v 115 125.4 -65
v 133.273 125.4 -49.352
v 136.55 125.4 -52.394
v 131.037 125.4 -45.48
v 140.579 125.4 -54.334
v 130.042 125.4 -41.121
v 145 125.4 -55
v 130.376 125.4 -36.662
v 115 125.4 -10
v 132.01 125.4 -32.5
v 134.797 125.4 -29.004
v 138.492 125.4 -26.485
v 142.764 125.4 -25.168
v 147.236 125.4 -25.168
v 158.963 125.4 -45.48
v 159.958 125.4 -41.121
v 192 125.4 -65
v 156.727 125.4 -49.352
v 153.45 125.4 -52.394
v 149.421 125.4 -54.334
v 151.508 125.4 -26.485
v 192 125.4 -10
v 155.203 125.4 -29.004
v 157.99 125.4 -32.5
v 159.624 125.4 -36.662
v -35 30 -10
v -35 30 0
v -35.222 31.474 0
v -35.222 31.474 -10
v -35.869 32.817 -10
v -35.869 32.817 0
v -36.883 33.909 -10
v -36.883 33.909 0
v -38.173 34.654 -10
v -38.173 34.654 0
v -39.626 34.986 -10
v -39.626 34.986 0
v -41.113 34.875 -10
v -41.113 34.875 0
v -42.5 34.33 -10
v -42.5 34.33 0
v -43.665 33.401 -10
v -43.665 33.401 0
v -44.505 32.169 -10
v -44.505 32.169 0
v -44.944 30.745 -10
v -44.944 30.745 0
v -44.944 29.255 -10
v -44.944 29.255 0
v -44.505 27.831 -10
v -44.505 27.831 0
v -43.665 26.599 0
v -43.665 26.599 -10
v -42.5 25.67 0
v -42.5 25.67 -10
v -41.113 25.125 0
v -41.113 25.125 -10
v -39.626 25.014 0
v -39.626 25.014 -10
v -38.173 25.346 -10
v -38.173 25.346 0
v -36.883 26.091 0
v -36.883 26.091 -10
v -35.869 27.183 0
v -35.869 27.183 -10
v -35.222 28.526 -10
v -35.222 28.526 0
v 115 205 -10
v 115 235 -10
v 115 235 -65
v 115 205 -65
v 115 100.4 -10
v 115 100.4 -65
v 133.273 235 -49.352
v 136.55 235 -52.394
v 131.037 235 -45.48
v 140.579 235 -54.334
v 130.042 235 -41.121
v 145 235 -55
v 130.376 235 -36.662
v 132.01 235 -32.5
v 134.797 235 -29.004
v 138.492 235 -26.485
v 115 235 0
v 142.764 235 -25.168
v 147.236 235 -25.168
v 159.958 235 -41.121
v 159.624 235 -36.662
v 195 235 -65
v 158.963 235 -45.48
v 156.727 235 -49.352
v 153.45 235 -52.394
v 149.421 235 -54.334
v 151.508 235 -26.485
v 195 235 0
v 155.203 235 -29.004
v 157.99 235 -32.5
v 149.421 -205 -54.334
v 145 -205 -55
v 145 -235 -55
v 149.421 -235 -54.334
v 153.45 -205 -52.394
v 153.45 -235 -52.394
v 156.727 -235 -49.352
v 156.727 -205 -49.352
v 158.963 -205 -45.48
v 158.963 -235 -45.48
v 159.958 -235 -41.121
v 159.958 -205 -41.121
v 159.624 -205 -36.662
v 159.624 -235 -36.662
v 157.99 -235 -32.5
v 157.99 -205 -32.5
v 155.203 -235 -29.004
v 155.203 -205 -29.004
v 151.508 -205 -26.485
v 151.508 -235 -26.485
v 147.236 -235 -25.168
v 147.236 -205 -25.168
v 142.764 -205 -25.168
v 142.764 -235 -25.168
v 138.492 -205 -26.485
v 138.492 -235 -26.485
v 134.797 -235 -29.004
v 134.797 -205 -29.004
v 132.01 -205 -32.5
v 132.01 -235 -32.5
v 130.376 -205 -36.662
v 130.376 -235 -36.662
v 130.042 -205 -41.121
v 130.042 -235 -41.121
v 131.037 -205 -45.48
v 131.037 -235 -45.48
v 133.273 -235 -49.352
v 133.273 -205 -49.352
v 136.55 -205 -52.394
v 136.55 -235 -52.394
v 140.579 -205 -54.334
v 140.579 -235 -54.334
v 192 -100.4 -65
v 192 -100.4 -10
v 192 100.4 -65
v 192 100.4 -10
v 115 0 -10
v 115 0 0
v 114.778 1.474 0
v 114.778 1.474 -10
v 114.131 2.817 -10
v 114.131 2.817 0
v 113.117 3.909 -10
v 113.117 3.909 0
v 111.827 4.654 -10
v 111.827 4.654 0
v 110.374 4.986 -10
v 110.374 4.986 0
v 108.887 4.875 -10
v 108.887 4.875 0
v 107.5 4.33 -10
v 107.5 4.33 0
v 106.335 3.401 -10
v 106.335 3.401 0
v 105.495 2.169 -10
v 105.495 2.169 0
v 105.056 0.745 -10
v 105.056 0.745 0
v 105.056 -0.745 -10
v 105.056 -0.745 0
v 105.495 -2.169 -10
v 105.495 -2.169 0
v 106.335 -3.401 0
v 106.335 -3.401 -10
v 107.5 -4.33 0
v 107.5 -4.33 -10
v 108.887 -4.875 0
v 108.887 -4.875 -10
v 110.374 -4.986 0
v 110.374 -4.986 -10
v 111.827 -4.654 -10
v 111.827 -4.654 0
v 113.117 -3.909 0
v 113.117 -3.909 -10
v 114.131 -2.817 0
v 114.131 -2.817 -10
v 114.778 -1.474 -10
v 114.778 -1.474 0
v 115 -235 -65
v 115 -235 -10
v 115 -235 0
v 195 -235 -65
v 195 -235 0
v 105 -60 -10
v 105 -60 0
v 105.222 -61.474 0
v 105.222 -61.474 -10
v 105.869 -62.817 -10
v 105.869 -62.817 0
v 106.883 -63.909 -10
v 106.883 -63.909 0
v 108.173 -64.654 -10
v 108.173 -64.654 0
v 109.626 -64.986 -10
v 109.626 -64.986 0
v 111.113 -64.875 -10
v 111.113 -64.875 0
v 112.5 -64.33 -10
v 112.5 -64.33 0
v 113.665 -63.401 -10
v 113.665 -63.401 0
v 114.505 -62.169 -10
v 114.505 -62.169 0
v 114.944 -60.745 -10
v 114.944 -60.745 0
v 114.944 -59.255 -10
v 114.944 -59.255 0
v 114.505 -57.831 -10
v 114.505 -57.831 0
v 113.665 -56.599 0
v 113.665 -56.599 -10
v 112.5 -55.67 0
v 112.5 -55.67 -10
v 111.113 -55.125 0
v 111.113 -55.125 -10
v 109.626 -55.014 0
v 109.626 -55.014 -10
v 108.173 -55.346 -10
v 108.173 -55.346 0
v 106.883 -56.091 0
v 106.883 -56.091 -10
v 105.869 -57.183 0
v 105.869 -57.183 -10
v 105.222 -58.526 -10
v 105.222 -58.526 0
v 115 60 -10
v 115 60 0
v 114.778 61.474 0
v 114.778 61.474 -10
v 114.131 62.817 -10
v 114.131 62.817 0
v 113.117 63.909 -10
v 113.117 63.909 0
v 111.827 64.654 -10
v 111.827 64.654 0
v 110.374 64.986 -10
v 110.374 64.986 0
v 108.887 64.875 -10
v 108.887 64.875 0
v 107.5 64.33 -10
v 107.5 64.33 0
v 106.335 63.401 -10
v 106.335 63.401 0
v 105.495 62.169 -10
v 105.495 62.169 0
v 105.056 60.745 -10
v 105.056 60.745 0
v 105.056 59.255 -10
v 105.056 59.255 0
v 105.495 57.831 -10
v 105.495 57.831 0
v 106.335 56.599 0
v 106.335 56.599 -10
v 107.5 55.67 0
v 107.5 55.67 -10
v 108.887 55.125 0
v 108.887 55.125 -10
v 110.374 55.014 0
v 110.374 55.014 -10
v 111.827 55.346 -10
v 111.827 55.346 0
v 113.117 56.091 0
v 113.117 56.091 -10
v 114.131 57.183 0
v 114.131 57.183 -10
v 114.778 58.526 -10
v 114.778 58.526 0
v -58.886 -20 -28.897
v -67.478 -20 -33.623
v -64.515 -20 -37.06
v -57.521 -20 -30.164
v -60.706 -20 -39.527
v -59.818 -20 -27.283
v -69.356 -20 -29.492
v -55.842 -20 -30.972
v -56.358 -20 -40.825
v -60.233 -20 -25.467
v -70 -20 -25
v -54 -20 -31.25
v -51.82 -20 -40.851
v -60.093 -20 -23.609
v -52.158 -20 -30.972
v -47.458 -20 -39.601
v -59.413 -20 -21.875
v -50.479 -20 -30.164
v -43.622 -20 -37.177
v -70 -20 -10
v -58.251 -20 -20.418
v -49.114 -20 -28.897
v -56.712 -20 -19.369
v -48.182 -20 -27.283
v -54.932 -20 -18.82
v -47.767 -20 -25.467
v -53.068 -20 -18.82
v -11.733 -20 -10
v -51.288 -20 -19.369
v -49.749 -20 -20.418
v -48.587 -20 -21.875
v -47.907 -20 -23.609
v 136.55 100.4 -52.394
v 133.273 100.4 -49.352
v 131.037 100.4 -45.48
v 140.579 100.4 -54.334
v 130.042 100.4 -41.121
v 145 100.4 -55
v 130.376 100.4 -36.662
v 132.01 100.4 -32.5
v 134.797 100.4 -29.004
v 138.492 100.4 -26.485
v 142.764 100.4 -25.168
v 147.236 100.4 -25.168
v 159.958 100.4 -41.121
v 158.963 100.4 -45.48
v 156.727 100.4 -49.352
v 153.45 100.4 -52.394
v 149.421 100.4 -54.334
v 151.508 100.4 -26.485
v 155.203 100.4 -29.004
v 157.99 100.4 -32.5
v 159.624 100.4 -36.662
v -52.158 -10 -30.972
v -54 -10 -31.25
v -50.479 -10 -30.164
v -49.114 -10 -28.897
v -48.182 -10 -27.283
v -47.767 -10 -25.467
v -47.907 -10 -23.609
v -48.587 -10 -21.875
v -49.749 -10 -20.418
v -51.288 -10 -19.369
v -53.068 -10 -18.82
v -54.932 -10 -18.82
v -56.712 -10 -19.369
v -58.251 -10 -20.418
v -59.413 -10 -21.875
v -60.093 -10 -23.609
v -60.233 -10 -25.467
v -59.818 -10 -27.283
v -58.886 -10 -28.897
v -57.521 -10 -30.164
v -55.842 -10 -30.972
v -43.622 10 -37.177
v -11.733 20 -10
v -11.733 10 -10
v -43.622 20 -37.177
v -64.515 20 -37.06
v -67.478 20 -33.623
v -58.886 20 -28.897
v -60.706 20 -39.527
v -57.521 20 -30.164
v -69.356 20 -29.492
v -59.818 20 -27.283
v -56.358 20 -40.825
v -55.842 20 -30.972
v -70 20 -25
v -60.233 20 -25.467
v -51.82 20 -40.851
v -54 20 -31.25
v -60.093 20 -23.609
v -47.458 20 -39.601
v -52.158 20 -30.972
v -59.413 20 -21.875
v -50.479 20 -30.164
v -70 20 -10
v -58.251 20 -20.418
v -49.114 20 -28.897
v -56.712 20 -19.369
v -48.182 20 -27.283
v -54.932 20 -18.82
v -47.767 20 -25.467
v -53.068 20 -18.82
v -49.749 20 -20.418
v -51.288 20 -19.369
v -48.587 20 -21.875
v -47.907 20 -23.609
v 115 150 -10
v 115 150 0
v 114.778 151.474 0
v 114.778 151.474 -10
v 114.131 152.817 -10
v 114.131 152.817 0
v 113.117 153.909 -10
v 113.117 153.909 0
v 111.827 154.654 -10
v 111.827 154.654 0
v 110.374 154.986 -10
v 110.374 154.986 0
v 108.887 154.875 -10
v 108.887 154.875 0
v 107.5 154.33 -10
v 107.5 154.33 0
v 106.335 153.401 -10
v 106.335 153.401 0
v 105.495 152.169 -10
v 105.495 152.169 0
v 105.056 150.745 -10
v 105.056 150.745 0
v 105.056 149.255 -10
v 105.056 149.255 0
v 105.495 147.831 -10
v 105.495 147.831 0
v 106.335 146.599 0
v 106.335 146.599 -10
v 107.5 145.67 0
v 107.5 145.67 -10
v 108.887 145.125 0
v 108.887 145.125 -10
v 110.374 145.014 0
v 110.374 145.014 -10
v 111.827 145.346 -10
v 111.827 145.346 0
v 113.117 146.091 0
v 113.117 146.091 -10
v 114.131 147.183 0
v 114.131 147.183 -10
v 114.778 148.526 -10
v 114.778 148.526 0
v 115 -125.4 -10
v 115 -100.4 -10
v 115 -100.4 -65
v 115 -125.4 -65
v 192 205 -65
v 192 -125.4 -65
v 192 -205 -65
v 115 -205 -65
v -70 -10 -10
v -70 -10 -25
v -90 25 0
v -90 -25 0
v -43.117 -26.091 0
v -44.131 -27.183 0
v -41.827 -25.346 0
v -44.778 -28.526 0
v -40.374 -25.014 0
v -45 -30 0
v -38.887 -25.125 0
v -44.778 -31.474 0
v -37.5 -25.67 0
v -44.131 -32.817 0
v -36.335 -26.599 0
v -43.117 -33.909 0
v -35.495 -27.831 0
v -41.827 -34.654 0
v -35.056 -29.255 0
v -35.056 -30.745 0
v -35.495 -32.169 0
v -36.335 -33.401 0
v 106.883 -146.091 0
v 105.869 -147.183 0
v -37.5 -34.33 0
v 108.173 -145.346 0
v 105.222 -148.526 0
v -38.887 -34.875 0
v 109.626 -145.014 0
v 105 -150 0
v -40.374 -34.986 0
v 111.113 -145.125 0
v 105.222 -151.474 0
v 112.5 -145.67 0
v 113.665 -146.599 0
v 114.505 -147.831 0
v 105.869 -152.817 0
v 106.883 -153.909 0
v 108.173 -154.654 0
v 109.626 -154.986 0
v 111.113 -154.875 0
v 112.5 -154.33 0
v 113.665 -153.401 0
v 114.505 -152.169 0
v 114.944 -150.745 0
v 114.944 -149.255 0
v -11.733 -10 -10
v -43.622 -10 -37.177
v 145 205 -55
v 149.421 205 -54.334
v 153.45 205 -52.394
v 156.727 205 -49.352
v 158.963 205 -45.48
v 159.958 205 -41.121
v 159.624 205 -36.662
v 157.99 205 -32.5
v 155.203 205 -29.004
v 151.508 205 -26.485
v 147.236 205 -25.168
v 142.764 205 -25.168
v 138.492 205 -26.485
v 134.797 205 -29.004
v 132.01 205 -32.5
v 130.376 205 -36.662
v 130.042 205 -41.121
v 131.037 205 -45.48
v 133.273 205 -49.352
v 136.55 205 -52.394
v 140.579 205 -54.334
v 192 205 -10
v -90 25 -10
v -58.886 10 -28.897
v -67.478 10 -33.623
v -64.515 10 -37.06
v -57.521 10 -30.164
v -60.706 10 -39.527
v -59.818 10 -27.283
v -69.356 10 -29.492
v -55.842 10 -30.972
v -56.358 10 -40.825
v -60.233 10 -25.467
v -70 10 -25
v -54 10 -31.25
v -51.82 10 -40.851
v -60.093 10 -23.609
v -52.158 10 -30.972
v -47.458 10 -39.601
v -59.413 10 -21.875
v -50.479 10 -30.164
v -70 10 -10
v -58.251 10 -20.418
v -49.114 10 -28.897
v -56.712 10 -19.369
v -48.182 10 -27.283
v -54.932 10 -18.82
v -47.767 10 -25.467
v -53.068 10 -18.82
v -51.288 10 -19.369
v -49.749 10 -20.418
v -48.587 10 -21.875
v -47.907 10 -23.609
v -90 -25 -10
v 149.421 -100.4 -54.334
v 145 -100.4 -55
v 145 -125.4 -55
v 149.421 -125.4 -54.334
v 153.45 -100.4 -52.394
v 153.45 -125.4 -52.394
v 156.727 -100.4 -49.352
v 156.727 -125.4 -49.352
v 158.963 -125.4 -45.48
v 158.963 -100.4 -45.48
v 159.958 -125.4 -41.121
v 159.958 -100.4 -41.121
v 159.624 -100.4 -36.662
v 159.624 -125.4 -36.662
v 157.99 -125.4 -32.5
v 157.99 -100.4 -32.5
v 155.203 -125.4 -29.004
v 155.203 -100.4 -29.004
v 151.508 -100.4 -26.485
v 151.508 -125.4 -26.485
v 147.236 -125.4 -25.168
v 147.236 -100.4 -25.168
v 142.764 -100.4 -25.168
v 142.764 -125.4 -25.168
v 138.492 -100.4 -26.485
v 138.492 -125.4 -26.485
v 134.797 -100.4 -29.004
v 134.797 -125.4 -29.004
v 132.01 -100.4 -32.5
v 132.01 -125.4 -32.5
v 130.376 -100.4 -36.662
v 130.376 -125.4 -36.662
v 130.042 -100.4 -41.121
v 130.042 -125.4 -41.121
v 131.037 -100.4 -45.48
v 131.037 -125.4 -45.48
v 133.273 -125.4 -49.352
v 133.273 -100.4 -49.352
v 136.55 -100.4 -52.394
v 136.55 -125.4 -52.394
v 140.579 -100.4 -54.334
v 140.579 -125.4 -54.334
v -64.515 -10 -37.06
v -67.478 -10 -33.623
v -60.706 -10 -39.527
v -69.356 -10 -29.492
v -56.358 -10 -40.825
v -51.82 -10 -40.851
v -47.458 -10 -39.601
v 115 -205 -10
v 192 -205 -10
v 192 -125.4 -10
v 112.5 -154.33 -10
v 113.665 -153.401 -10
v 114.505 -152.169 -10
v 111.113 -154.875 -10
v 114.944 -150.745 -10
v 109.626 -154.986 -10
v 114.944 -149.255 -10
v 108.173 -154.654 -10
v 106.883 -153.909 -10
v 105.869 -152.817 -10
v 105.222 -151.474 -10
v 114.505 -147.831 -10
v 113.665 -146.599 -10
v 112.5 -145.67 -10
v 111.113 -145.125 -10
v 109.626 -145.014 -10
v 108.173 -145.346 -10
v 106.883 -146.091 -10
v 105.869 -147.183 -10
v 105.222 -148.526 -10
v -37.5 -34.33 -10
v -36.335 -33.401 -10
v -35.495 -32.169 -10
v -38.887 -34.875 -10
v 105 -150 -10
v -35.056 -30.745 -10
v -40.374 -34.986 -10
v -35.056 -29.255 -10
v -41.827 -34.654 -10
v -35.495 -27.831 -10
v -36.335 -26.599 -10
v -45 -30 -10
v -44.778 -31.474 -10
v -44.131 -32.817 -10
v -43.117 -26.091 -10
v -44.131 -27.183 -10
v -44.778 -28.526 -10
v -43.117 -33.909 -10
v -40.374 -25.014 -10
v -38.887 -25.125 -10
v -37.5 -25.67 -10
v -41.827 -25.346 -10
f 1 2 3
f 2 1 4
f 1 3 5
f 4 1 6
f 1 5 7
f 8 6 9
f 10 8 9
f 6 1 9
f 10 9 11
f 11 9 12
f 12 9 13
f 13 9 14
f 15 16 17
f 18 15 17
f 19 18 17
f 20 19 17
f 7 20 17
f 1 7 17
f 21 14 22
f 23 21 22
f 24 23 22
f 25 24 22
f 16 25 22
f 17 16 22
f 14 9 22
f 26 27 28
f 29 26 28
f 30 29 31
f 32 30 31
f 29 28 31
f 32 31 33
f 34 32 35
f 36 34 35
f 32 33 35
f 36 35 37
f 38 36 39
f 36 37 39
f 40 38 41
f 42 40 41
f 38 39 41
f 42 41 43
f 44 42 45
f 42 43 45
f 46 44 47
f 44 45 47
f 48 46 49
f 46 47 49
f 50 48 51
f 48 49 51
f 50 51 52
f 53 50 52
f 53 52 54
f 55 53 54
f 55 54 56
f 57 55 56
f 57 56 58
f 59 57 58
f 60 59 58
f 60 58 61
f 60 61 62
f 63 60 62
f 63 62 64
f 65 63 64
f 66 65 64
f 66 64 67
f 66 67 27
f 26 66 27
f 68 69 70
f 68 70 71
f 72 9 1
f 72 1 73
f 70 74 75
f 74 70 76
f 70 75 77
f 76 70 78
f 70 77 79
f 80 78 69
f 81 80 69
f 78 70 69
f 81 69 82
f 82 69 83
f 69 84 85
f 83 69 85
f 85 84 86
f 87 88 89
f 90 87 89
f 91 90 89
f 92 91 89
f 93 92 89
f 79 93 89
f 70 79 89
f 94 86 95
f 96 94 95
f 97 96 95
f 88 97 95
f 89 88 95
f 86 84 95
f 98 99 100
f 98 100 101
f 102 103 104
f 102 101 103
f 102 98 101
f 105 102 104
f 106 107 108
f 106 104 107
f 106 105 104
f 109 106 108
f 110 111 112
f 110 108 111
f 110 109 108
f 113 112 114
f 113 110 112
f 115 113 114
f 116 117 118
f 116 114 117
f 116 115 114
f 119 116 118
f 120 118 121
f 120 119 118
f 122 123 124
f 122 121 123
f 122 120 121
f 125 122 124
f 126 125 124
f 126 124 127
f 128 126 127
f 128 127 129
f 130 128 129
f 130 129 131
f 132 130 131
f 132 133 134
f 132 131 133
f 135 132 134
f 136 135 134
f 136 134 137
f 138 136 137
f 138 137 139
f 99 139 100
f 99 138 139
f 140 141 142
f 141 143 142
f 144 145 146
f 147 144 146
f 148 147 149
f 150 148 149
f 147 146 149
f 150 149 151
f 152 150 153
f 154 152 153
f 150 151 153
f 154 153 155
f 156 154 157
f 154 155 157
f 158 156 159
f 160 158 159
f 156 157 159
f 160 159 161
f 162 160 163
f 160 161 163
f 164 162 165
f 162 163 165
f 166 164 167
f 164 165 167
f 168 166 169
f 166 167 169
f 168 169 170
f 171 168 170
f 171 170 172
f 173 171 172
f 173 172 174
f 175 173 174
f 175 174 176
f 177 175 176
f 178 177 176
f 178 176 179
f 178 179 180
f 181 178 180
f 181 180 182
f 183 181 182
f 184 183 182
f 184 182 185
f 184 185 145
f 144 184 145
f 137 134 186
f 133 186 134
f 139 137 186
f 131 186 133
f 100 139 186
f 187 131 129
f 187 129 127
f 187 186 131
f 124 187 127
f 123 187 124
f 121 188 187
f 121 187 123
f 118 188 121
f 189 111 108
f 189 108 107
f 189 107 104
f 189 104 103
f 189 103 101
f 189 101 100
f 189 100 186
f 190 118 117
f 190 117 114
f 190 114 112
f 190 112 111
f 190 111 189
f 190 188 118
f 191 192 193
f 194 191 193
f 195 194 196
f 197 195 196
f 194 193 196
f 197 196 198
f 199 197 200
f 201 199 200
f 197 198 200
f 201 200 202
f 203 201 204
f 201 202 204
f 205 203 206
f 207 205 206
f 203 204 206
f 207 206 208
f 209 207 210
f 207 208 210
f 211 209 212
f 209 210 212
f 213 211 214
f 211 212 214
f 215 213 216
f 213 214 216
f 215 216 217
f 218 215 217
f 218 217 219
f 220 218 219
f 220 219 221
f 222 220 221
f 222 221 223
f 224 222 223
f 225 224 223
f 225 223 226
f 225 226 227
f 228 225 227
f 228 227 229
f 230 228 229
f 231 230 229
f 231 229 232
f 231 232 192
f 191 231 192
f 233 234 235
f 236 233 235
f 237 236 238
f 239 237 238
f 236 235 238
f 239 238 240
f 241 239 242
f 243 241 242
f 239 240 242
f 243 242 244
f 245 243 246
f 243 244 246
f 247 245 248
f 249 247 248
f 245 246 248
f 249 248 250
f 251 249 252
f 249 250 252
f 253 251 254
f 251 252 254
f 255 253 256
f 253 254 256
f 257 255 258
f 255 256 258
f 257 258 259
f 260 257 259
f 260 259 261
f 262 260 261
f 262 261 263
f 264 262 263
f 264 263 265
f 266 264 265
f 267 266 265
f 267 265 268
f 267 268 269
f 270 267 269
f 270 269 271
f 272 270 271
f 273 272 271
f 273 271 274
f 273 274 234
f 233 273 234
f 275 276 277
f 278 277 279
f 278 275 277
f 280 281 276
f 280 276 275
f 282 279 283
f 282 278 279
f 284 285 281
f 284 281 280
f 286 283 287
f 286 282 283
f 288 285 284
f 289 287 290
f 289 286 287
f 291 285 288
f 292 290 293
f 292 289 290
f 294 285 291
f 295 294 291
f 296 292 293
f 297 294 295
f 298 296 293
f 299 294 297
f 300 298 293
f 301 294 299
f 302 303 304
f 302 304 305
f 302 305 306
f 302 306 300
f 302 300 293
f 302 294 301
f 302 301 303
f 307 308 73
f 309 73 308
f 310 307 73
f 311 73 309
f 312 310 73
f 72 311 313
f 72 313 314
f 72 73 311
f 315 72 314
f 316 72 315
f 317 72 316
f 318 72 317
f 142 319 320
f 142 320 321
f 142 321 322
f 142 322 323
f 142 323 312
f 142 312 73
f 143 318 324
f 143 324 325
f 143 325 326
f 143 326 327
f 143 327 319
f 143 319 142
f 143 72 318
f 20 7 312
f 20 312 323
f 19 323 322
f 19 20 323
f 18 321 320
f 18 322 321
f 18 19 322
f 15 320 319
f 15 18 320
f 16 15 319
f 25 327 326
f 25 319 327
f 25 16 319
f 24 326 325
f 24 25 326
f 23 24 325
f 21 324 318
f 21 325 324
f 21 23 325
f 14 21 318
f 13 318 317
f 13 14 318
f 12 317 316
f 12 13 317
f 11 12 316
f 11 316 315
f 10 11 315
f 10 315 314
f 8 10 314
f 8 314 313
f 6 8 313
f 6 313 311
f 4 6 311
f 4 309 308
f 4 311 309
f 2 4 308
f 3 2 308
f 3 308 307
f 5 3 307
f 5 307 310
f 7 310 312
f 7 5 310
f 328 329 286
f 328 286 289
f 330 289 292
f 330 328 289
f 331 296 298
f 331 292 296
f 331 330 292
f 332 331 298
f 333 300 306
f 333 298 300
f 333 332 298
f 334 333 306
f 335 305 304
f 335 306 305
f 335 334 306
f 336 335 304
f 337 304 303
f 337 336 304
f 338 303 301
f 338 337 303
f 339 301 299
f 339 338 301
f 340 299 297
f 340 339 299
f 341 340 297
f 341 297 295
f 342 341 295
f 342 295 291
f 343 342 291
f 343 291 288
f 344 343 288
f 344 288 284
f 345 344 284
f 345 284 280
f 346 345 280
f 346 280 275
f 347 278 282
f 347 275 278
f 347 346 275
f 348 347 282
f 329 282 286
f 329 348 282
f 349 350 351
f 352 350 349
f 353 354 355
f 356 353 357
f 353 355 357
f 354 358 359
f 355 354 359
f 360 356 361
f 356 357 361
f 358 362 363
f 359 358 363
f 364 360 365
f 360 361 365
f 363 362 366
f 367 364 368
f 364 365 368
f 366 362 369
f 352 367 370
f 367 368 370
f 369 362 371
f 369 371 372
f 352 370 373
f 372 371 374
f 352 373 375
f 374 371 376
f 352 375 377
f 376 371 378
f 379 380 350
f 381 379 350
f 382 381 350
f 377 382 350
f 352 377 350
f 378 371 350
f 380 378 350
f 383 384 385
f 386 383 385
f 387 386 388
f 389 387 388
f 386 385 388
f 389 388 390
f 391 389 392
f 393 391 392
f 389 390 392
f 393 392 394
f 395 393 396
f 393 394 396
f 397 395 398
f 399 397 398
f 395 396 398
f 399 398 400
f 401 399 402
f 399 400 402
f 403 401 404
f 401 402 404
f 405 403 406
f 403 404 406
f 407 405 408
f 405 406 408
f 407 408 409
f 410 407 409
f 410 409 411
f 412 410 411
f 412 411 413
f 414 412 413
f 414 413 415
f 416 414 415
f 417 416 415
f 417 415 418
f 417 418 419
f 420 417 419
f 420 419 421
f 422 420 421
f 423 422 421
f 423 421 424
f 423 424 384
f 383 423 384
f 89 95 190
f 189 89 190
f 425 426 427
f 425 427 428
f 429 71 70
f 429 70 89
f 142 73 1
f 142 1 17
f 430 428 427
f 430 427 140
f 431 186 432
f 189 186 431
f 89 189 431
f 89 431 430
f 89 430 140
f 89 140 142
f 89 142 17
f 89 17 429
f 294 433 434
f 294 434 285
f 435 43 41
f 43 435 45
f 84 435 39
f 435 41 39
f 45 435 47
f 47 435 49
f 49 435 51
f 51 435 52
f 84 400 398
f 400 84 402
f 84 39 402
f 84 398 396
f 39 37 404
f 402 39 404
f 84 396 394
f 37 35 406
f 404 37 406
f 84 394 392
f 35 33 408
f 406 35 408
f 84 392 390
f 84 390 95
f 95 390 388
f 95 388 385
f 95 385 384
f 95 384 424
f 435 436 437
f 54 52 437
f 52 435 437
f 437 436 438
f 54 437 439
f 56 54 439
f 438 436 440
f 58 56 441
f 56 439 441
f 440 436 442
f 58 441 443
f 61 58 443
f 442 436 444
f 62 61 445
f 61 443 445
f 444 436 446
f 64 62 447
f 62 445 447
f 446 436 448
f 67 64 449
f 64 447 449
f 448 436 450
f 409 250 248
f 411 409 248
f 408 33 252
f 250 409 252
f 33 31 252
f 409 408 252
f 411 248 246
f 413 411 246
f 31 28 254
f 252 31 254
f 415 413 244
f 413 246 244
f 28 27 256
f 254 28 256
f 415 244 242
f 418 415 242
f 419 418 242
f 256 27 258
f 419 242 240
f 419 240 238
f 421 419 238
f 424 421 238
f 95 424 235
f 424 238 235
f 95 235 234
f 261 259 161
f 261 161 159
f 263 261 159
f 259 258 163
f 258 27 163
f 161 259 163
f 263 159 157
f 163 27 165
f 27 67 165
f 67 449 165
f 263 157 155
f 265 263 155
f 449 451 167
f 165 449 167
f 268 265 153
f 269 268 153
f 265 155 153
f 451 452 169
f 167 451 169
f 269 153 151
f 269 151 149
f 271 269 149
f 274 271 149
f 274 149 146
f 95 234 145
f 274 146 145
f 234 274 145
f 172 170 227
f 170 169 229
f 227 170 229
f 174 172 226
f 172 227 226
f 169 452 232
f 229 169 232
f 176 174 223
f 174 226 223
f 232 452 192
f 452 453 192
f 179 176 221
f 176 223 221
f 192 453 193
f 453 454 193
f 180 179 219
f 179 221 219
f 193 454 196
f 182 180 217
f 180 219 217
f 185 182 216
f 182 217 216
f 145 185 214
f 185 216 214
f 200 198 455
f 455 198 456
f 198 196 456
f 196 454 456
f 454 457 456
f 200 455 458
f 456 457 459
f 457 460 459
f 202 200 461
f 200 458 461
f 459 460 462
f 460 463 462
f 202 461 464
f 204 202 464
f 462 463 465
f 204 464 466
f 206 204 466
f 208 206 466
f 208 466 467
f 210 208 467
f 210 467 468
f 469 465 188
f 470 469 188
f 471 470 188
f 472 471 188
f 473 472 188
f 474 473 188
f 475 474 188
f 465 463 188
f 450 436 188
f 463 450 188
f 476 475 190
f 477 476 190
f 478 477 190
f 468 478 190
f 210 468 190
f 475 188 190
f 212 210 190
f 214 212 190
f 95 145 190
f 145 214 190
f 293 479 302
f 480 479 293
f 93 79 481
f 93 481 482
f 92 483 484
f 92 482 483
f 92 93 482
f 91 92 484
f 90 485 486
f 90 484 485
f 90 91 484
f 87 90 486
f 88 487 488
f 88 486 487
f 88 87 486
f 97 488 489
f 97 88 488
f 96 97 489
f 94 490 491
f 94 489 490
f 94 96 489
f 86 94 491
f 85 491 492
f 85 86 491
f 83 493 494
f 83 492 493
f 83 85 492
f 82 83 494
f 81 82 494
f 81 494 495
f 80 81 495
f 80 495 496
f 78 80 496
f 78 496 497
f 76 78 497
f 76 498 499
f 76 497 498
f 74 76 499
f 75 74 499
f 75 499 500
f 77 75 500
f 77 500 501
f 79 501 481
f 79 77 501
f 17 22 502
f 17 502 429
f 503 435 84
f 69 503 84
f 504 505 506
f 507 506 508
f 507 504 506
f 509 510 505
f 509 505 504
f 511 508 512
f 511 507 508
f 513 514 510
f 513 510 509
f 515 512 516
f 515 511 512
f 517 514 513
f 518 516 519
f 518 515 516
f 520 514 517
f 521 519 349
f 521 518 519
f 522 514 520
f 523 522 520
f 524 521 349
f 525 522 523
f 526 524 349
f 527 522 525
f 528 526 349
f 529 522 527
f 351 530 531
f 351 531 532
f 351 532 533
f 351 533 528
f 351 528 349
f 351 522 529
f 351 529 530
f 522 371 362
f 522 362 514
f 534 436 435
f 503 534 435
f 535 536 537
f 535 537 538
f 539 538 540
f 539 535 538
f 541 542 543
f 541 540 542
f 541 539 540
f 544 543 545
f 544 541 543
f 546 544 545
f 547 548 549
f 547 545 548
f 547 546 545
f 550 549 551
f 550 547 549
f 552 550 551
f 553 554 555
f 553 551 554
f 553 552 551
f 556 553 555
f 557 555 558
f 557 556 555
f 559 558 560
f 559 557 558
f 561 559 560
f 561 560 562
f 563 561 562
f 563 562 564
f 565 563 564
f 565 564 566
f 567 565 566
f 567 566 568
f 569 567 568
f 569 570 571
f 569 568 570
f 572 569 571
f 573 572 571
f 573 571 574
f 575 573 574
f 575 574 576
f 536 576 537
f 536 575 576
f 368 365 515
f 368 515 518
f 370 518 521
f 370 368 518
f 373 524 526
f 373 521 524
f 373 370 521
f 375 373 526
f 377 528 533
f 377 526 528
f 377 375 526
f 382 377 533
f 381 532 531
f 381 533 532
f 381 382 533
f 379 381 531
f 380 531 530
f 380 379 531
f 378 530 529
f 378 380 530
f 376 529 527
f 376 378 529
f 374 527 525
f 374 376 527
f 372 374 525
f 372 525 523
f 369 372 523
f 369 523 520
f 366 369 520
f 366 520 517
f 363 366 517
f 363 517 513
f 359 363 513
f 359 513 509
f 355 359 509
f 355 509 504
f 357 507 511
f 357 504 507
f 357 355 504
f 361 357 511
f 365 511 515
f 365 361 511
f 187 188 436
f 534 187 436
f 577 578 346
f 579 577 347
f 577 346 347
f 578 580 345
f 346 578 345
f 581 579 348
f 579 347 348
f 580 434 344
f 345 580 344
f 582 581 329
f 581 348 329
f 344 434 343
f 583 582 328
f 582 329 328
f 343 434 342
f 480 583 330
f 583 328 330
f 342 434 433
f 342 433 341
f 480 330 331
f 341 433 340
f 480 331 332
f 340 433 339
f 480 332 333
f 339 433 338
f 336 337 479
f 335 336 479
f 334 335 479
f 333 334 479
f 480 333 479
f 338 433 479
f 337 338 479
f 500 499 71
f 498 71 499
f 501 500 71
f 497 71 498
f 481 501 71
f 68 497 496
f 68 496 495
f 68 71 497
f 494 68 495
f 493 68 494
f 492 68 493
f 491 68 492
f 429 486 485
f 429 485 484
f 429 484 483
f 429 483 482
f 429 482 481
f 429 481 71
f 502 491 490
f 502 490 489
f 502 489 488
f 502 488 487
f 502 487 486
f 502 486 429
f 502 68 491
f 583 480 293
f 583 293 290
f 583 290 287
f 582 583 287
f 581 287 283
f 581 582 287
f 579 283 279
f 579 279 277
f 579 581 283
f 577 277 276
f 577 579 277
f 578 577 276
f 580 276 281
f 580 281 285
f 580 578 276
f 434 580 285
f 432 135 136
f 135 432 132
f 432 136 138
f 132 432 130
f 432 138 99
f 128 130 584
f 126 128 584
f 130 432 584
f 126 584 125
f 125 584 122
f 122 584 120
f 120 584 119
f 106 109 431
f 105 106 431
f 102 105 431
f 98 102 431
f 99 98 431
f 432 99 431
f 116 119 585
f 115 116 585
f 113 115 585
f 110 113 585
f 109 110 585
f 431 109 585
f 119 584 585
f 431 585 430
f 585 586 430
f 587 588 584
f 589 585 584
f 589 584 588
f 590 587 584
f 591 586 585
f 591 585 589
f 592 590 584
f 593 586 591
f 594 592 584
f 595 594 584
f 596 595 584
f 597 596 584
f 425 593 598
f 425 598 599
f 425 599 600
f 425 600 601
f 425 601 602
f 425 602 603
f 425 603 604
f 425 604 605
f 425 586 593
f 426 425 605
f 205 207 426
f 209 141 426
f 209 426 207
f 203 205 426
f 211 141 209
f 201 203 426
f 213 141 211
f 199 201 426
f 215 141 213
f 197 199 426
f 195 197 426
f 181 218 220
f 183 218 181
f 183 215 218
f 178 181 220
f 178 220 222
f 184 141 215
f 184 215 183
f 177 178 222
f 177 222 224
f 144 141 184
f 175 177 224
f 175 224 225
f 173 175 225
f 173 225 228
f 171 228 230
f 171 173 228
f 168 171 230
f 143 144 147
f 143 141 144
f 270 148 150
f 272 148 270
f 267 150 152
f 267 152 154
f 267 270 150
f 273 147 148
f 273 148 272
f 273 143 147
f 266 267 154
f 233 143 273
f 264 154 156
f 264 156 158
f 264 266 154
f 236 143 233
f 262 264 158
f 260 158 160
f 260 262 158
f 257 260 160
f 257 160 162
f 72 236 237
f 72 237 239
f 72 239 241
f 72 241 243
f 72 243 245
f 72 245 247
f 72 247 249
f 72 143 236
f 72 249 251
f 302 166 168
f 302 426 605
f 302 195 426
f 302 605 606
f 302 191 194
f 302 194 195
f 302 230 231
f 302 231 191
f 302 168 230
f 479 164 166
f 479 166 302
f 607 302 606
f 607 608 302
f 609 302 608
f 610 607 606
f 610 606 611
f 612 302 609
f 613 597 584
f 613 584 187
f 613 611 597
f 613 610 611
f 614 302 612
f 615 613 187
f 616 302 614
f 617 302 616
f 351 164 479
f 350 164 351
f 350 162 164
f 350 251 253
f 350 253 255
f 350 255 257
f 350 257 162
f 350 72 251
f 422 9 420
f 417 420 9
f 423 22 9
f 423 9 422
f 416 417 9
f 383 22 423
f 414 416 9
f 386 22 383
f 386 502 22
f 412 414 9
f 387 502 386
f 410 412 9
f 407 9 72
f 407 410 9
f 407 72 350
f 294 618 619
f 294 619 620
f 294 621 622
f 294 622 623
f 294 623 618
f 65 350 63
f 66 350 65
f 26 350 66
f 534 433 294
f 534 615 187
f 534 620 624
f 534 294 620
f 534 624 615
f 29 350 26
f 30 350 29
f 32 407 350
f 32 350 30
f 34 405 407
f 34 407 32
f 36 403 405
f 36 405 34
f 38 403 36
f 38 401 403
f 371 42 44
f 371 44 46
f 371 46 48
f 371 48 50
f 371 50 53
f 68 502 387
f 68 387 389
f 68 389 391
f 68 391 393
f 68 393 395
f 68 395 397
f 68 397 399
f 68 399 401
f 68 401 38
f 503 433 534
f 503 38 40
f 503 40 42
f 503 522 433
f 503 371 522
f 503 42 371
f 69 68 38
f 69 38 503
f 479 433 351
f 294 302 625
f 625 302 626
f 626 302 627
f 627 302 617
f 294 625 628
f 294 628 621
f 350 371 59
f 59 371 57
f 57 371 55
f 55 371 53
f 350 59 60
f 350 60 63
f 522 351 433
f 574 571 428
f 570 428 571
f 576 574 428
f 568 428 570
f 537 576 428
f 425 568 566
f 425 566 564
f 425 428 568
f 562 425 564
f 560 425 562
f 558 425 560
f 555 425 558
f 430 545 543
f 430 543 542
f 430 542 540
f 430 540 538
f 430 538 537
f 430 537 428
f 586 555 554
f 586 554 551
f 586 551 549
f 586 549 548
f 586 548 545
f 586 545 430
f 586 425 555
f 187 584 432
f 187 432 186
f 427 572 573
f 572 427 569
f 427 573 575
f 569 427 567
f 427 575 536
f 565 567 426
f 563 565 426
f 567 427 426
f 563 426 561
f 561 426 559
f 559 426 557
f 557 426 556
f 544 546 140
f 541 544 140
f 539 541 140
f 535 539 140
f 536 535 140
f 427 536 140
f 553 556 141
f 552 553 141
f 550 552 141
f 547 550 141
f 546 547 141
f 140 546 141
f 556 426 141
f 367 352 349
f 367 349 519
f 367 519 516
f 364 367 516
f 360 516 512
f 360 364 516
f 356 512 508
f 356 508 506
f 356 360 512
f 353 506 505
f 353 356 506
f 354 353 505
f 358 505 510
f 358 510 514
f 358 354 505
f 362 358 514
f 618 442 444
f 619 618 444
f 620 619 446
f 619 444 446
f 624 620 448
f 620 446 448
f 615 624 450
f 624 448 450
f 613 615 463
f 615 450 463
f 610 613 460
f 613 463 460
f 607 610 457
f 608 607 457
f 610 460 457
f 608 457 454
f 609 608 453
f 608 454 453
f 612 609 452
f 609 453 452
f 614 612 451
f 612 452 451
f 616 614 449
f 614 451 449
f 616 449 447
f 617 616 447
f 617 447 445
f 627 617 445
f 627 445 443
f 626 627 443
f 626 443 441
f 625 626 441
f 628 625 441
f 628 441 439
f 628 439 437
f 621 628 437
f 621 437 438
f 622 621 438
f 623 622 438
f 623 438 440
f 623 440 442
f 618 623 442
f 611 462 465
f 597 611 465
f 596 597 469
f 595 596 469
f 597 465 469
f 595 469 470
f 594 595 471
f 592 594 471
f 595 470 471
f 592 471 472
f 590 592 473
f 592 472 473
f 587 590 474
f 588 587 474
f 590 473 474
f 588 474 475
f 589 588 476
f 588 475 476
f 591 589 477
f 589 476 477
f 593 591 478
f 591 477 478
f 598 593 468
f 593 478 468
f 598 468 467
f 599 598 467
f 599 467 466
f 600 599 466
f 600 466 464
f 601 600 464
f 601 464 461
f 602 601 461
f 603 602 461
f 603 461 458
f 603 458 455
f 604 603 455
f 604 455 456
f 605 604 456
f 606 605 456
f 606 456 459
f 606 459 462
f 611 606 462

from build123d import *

# Parameters (mm, degrees)
SKETCH2_W               = 80
SKETCH2_H               = 25
BOSS_EXTRUDE1_DEPTH     = 65
BOSS_EXTRUDE1_2_DEPTH   = 65
SKETCH2_W_2             = 70
SKETCH2_H_2             = 10
BOSS_EXTRUDE1_3_DEPTH   = 65
BOSS_EXTRUDE1_4_DEPTH   = 65
SKETCH2_H_3             = 30
BOSS_EXTRUDE1_5_DEPTH   = 65
BOSS_EXTRUDE1_6_DEPTH   = 65
CUT_EXTRUDE1_DEPTH      = 313.209865315
CUT_EXTRUDE1_DEPTH_BACK = 313.209865315
SKETCH3_R               = 15
SKETCH3_R_2             = 6.25
BOSS_EXTRUDE5_DEPTH     = 10
CUT_EXTRUDE2_REACH      = 314.21
SKETCH7_R               = 5
SKETCH8_W               = 65
SKETCH8_H               = 470
BOSS_EXTRUDE6_DEPTH     = 3


with BuildPart() as part:
    # Sketch2 → Boss-Extrude1 (new body)
    with BuildSketch(Plane(origin=(0, 0, 0), x_dir=(1, 0, 0), z_dir=(0, 0, -1))):
        with Locations((155, -112.9)):
            Rectangle(SKETCH2_W, SKETCH2_H)
    extrude(amount=BOSS_EXTRUDE1_DEPTH)


with BuildPart() as body_2:
    # Sketch2 → Boss-Extrude1 2 (new body)
    with BuildSketch(Plane(origin=(0, 0, 0), x_dir=(1, 0, 0), z_dir=(0, 0, -1))):
        with Locations((155, 112.9)):
            Rectangle(SKETCH2_W, SKETCH2_H)
    extrude(amount=BOSS_EXTRUDE1_2_DEPTH)


with BuildPart() as body_3:
    # Sketch2 → Boss-Extrude1 3 (new body)
    with BuildSketch(Plane(origin=(0, 0, 0), x_dir=(1, 0, 0), z_dir=(0, 0, -1))):
        with Locations((-35, 15)):
            Rectangle(SKETCH2_W_2, SKETCH2_H_2)
    extrude(amount=BOSS_EXTRUDE1_3_DEPTH)


with BuildPart() as body_4:
    # Sketch2 → Boss-Extrude1 4 (new body)
    with BuildSketch(Plane(origin=(0, 0, 0), x_dir=(1, 0, 0), z_dir=(0, 0, -1))):
        with Locations((-35, -15)):
            Rectangle(SKETCH2_W_2, SKETCH2_H_2)
    extrude(amount=BOSS_EXTRUDE1_4_DEPTH)


with BuildPart() as body_5:
    # Sketch2 → Boss-Extrude1 5 (new body)
    with BuildSketch(Plane(origin=(0, 0, 0), x_dir=(1, 0, 0), z_dir=(0, 0, -1))):
        with Locations((155, 220)):
            Rectangle(SKETCH2_W, SKETCH2_H_3)
    extrude(amount=BOSS_EXTRUDE1_5_DEPTH)


with BuildPart() as body_6:
    # Sketch2 → Boss-Extrude1 6 (new body)
    with BuildSketch(Plane(origin=(0, 0, 0), x_dir=(1, 0, 0), z_dir=(0, 0, -1))):
        with Locations((155, -220)):
            Rectangle(SKETCH2_W, SKETCH2_H_3)
    extrude(amount=BOSS_EXTRUDE1_6_DEPTH)


with BuildPart() as cut_extrude1_tool:
    # Sketch3 → Cut-Extrude1 (new, two sides: drawn at the far end of the back side and taken through both)
    with BuildSketch(Plane.XZ.offset(-CUT_EXTRUDE1_DEPTH_BACK)):
        with Locations(Location((145, -40, 0), (0, 0, 270))):
            Circle(SKETCH3_R)
        with Locations(Location((-54, -25, 0), (0, 0, 270))):
            Circle(SKETCH3_R_2)
        with BuildLine():
            Line((0, 0), (-43.621584917, -37.17737658))
            ThreePointArc((-43.621584917, -37.17737658), (-60.706167261, -39.526779432), (-70, -25))
            Line((-70, -25), (-75, -25))
            Line((-75, -25), (-75, -70))
            Line((-75, -70), (5, -70))
            Line((5, -70), (5, 0))
            Line((5, 0), (0, 0))
        make_face()
    extrude(amount=CUT_EXTRUDE1_DEPTH + CUT_EXTRUDE1_DEPTH_BACK)


with BuildPart() as part_1:
    add(part.part)

    # Cut-Extrude1: cut by cut_extrude1_tool
    add(cut_extrude1_tool.part, mode=Mode.SUBTRACT)



with BuildPart() as body_2_1:
    add(body_2.part)

    # Cut-Extrude1: cut by cut_extrude1_tool
    add(cut_extrude1_tool.part, mode=Mode.SUBTRACT)


with BuildPart() as body_3_1:
    add(body_3.part)

    # Cut-Extrude1: cut by cut_extrude1_tool
    add(cut_extrude1_tool.part, mode=Mode.SUBTRACT)


with BuildPart() as body_4_1:
    add(body_4.part)

    # Cut-Extrude1: cut by cut_extrude1_tool
    add(cut_extrude1_tool.part, mode=Mode.SUBTRACT)


with BuildPart() as body_5_1:
    add(body_5.part)

    # Cut-Extrude1: cut by cut_extrude1_tool
    add(cut_extrude1_tool.part, mode=Mode.SUBTRACT)


with BuildPart() as body_6_1:
    add(body_6.part)

    # Cut-Extrude1: cut by cut_extrude1_tool
    add(cut_extrude1_tool.part, mode=Mode.SUBTRACT)


with BuildPart() as part_2:
    add(part_1.part)

    add(body_2_1.part)  # Boss-Extrude5 merges body 2

    add(body_3_1.part)  # Boss-Extrude5 merges body 3

    add(body_4_1.part)  # Boss-Extrude5 merges body 4

    add(body_5_1.part)  # Boss-Extrude5 merges body 5

    add(body_6_1.part)  # Boss-Extrude5 merges body 6
    # Sketch6 → Boss-Extrude5 (add)
    with BuildSketch(Plane.XY):
        Polygon((195, 235), (195, -235), (115, -235), (-90, -25), (-90, 25), (115, 235), align=None)
    extrude(amount=-BOSS_EXTRUDE5_DEPTH)

    # Sketch7 → Cut-Extrude2 (cut, up to next)
    with BuildSketch(Plane.XY, mode=Mode.PRIVATE) as cut_extrude2_sk1:
        with Locations((110, 150)):
            Circle(SKETCH7_R)
    cut_extrude2_tool1 = extrude(cut_extrude2_sk1.sketch, amount=-CUT_EXTRUDE2_REACH, mode=Mode.PRIVATE) & part_2.part
    # Sketch7 → Cut-Extrude2 (cut, up to next)
    with BuildSketch(Plane.XY, mode=Mode.PRIVATE) as cut_extrude2_sk2:
        with Locations((110, 60)):
            Circle(SKETCH7_R)
    cut_extrude2_tool2 = extrude(cut_extrude2_sk2.sketch, amount=-CUT_EXTRUDE2_REACH, mode=Mode.PRIVATE) & part_2.part
    # Sketch7 → Cut-Extrude2 (cut, up to next)
    with BuildSketch(Plane.XY, mode=Mode.PRIVATE) as cut_extrude2_sk3:
        with Locations((110, 0)):
            Circle(SKETCH7_R)
    cut_extrude2_tool3 = extrude(cut_extrude2_sk3.sketch, amount=-CUT_EXTRUDE2_REACH, mode=Mode.PRIVATE) & part_2.part
    # Sketch7 → Cut-Extrude2 (cut, up to next)
    with BuildSketch(Plane.XY, mode=Mode.PRIVATE) as cut_extrude2_sk4:
        with Locations((-40, 30)):
            Circle(SKETCH7_R)
    cut_extrude2_tool4 = extrude(cut_extrude2_sk4.sketch, amount=-CUT_EXTRUDE2_REACH, mode=Mode.PRIVATE) & part_2.part
    # Sketch7 → Cut-Extrude2 (cut, up to next)
    with BuildSketch(Plane.XY, mode=Mode.PRIVATE) as cut_extrude2_sk5:
        with Locations(Location((-40, -30, 0), (0, 0, 180))):
            Circle(SKETCH7_R)
    cut_extrude2_tool5 = extrude(cut_extrude2_sk5.sketch, amount=-CUT_EXTRUDE2_REACH, mode=Mode.PRIVATE) & part_2.part
    # Sketch7 → Cut-Extrude2 (cut, up to next)
    with BuildSketch(Plane.XY, mode=Mode.PRIVATE) as cut_extrude2_sk6:
        with Locations(Location((110, -60, 0), (0, 0, 180))):
            Circle(SKETCH7_R)
    cut_extrude2_tool6 = extrude(cut_extrude2_sk6.sketch, amount=-CUT_EXTRUDE2_REACH, mode=Mode.PRIVATE) & part_2.part
    # Sketch7 → Cut-Extrude2 (cut, up to next)
    with BuildSketch(Plane.XY, mode=Mode.PRIVATE) as cut_extrude2_sk7:
        with Locations(Location((110, -150, 0), (0, 0, 180))):
            Circle(SKETCH7_R)
    cut_extrude2_tool7 = extrude(cut_extrude2_sk7.sketch, amount=-CUT_EXTRUDE2_REACH, mode=Mode.PRIVATE) & part_2.part
    add(cut_extrude2_tool1.solids().sort_by_distance((110, 150, 0))[0], mode=Mode.SUBTRACT)
    add(cut_extrude2_tool2.solids().sort_by_distance((110, 60, 0))[0], mode=Mode.SUBTRACT)
    add(cut_extrude2_tool3.solids().sort_by_distance((110, 0, 0))[0], mode=Mode.SUBTRACT)
    add(cut_extrude2_tool4.solids().sort_by_distance((-40, 30, 0))[0], mode=Mode.SUBTRACT)
    add(cut_extrude2_tool5.solids().sort_by_distance((-40, -30, 0))[0], mode=Mode.SUBTRACT)
    add(cut_extrude2_tool6.solids().sort_by_distance((110, -60, 0))[0], mode=Mode.SUBTRACT)
    add(cut_extrude2_tool7.solids().sort_by_distance((110, -150, 0))[0], mode=Mode.SUBTRACT)

    # Sketch8 → Boss-Extrude6 (add)
    with BuildSketch(Plane(origin=(195, 0, 0), x_dir=(0, 0, -1), z_dir=(1, 0, 0))):
        with Locations((32.5, 0)):
            Rectangle(SKETCH8_W, SKETCH8_H)
    extrude(amount=-BOSS_EXTRUDE6_DEPTH)


solid = part_2.part
